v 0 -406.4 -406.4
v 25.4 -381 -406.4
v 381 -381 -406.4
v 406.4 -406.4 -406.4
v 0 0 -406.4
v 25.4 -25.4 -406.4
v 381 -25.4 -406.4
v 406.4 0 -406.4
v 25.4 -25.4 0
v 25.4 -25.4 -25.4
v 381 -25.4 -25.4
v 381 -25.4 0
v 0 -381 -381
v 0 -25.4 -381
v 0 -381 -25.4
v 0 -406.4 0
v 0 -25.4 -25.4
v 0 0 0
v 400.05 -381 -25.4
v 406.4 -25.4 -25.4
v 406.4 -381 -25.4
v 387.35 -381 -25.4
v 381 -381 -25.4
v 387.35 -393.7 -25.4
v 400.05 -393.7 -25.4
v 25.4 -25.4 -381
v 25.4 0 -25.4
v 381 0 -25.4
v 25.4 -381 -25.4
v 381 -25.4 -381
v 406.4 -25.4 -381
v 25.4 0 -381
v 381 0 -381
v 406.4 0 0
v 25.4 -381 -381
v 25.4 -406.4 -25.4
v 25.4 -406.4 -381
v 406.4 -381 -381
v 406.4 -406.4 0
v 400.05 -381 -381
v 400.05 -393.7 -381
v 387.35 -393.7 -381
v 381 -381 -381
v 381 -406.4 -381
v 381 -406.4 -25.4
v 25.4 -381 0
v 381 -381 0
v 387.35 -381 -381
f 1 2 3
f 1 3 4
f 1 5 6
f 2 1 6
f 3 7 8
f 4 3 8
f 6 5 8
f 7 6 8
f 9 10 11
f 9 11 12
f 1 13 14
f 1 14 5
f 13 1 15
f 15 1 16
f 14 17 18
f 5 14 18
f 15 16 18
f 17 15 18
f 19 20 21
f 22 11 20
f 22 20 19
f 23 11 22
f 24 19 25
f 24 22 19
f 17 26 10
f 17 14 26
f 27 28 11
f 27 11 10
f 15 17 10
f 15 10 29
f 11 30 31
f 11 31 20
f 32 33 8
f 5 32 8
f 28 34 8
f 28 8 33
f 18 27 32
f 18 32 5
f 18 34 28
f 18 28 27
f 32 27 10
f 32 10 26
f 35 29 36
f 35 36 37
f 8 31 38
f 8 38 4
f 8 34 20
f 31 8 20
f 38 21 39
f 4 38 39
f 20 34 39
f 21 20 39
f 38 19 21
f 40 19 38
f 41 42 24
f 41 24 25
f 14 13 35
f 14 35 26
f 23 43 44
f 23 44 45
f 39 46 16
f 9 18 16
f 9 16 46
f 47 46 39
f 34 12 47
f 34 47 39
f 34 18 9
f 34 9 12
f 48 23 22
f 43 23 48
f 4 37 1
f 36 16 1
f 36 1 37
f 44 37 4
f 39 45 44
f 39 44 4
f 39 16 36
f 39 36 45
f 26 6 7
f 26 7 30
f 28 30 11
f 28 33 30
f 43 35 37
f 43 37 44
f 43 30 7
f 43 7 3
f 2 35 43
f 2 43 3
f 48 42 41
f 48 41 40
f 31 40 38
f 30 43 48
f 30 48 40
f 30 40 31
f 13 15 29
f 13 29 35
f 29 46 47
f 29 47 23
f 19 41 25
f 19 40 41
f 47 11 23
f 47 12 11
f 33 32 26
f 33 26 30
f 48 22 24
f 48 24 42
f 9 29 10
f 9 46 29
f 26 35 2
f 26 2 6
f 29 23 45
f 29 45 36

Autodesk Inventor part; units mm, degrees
ref_plane "YZ Plane" through (0, 0, 0) normal (1, 0, 0) x (0, 1, 0)
ref_plane "XZ Plane" through (0, 0, 0) normal (0, 1, 0) x (-1, 0, 0)
ref_plane "XY Plane" through (0, 0, 0) normal (0, 0, 1) x (1, 0, 0)
sketch "Sketch3" plane through (0, 0, 0) normal (0, 0, 1) x (1, 0, 0)
  line L0 (0, 0) -> (812.8, 0) construction
  line L1 (812.8, 0) -> (812.8, -406.4) construction
  line L2 (812.8, -406.4) -> (0, -406.4) construction
  line L3 (0, -406.4) -> (0, 0) construction
  line L4 (406.4, 0) -> (0, 0)
  line L5 (0, -406.4) -> (0, 0)
  line L6 (0, -406.4) -> (406.4, -406.4)
  line L7 (406.4, 0) -> (406.4, -406.4)
  dimension "d88" = 812.8
extrude "Extrusion2" add sketch "Sketch3" against normal blind 406.4
sketch "Sketch4" plane through (0, 0, 0) normal (0, 0, 1) x (1, 0, 0)
  line L0 (0, 0) -> (406.4, 0) projected
  line L1 (0, 0) -> (812.8, 0) construction
  line L2 (812.8, 0) -> (812.8, -406.4) construction
  line L3 (812.8, -406.4) -> (0, -406.4) construction
  line L4 (0, -406.4) -> (0, 0) construction
  line L5 (0, 0) -> (25.4, 0)
  line L6 (25.4, 0) -> (25.4, -25.4)
  line L7 (25.4, -25.4) -> (0, -25.4)
  line L8 (0, -25.4) -> (0, 0)
  line L9 (25.4, -25.4) -> (381, -25.4)
  line L10 (381, -25.4) -> (381, -381)
  line L11 (381, -381) -> (25.4, -381)
  line L12 (25.4, -381) -> (25.4, -25.4)
  dimension "d95" = 812.8
  dimension "d102" = 25.4
  dimension "d103" = 25.4
  dimension "d104" = 355.6
  dimension "d105" = 355.6
extrude "Extrusion3" cut sketch "Sketch4" against normal blind 406.4 contours L9 L10 L11 L12
sketch "Sketch5" plane through (0, -406.4, 0) normal (-1, 0, 0) x (0, 0, 1)
  line L0 (0, 406.4) -> (-406.4, 406.4) projected
  line L1 (-406.4, 406.4) -> (-381, 406.4)
  line L2 (-381, 406.4) -> (-381, 381)
  line L3 (-381, 381) -> (-406.4, 381)
  line L4 (-406.4, 381) -> (-406.4, 406.4)
  line L5 (-381, 381) -> (-25.4, 381)
  line L6 (-25.4, 381) -> (-25.4, 25.4)
  line L7 (-25.4, 25.4) -> (-381, 25.4)
  line L8 (-381, 25.4) -> (-381, 381)
  dimension "d108" = 25.4
  dimension "d109" = 25.4
  dimension "d110" = 355.6
  dimension "d111" = 355.6
extrude "Extrusion4" cut sketch "Sketch5" against normal blind 406.4 contours L5 L6 L7 L8
sketch "Sketch6" plane through (0, 0, 0) normal (0, 1, 0) x (1, 0, 0)
  line L0 (0, 406.4) -> (406.4, 406.4) projected
  line L1 (0, 406.4) -> (25.4, 406.4)
  line L2 (25.4, 406.4) -> (25.4, 381)
  line L3 (25.4, 381) -> (0, 381)
  line L4 (0, 381) -> (0, 406.4)
  line L5 (25.4, 381) -> (381, 381)
  line L6 (381, 381) -> (381, 25.4)
  line L7 (381, 25.4) -> (25.4, 25.4)
  line L8 (25.4, 25.4) -> (25.4, 381)
  point P0 (0, 0)
  dimension "d114" = 25.4
  dimension "d115" = 25.4
  dimension "d116" = 355.6
  dimension "d117" = 355.6
extrude "Extrusion5" cut sketch "Sketch6" against normal blind 406.4 contours L5 L6 L7 L8
sketch "Sketch7" plane through (0, 0, 0) normal (0, 0, 1) x (1, 0, 0)
  point P0 (0, 0)
sketch "Sketch8" plane through (406.4, -381, -25.4) normal (0, 1, 0) x (1, 0, 0)
  line L0 (-381, 0) -> (-25.4, 0) projected
  line L1 (-25.4, 0) -> (-12.7, 0)
  line L2 (-25.4, 0) -> (0, 0) projected
  line L3 (0, 0) -> (-12.7, 0)
  line L4 (-25.4, 355.6) -> (0, 355.6) projected
  line L5 (-6.35, 0) -> (-19.05, 0)
  line L6 (-19.05, 0) -> (-19.05, 355.6)
  line L7 (-19.05, 355.6) -> (-6.35, 355.6)
  line L8 (-6.35, 355.6) -> (-6.35, 0)
  point P0 (-406.4, -25.4)
  point P1 (-19.05, 0)
  dimension "d120" = 12.7
extrude "Extrusion6" cut sketch "Sketch8" against normal blind 12.7
properties part number "JukeBox Metal Frame"
